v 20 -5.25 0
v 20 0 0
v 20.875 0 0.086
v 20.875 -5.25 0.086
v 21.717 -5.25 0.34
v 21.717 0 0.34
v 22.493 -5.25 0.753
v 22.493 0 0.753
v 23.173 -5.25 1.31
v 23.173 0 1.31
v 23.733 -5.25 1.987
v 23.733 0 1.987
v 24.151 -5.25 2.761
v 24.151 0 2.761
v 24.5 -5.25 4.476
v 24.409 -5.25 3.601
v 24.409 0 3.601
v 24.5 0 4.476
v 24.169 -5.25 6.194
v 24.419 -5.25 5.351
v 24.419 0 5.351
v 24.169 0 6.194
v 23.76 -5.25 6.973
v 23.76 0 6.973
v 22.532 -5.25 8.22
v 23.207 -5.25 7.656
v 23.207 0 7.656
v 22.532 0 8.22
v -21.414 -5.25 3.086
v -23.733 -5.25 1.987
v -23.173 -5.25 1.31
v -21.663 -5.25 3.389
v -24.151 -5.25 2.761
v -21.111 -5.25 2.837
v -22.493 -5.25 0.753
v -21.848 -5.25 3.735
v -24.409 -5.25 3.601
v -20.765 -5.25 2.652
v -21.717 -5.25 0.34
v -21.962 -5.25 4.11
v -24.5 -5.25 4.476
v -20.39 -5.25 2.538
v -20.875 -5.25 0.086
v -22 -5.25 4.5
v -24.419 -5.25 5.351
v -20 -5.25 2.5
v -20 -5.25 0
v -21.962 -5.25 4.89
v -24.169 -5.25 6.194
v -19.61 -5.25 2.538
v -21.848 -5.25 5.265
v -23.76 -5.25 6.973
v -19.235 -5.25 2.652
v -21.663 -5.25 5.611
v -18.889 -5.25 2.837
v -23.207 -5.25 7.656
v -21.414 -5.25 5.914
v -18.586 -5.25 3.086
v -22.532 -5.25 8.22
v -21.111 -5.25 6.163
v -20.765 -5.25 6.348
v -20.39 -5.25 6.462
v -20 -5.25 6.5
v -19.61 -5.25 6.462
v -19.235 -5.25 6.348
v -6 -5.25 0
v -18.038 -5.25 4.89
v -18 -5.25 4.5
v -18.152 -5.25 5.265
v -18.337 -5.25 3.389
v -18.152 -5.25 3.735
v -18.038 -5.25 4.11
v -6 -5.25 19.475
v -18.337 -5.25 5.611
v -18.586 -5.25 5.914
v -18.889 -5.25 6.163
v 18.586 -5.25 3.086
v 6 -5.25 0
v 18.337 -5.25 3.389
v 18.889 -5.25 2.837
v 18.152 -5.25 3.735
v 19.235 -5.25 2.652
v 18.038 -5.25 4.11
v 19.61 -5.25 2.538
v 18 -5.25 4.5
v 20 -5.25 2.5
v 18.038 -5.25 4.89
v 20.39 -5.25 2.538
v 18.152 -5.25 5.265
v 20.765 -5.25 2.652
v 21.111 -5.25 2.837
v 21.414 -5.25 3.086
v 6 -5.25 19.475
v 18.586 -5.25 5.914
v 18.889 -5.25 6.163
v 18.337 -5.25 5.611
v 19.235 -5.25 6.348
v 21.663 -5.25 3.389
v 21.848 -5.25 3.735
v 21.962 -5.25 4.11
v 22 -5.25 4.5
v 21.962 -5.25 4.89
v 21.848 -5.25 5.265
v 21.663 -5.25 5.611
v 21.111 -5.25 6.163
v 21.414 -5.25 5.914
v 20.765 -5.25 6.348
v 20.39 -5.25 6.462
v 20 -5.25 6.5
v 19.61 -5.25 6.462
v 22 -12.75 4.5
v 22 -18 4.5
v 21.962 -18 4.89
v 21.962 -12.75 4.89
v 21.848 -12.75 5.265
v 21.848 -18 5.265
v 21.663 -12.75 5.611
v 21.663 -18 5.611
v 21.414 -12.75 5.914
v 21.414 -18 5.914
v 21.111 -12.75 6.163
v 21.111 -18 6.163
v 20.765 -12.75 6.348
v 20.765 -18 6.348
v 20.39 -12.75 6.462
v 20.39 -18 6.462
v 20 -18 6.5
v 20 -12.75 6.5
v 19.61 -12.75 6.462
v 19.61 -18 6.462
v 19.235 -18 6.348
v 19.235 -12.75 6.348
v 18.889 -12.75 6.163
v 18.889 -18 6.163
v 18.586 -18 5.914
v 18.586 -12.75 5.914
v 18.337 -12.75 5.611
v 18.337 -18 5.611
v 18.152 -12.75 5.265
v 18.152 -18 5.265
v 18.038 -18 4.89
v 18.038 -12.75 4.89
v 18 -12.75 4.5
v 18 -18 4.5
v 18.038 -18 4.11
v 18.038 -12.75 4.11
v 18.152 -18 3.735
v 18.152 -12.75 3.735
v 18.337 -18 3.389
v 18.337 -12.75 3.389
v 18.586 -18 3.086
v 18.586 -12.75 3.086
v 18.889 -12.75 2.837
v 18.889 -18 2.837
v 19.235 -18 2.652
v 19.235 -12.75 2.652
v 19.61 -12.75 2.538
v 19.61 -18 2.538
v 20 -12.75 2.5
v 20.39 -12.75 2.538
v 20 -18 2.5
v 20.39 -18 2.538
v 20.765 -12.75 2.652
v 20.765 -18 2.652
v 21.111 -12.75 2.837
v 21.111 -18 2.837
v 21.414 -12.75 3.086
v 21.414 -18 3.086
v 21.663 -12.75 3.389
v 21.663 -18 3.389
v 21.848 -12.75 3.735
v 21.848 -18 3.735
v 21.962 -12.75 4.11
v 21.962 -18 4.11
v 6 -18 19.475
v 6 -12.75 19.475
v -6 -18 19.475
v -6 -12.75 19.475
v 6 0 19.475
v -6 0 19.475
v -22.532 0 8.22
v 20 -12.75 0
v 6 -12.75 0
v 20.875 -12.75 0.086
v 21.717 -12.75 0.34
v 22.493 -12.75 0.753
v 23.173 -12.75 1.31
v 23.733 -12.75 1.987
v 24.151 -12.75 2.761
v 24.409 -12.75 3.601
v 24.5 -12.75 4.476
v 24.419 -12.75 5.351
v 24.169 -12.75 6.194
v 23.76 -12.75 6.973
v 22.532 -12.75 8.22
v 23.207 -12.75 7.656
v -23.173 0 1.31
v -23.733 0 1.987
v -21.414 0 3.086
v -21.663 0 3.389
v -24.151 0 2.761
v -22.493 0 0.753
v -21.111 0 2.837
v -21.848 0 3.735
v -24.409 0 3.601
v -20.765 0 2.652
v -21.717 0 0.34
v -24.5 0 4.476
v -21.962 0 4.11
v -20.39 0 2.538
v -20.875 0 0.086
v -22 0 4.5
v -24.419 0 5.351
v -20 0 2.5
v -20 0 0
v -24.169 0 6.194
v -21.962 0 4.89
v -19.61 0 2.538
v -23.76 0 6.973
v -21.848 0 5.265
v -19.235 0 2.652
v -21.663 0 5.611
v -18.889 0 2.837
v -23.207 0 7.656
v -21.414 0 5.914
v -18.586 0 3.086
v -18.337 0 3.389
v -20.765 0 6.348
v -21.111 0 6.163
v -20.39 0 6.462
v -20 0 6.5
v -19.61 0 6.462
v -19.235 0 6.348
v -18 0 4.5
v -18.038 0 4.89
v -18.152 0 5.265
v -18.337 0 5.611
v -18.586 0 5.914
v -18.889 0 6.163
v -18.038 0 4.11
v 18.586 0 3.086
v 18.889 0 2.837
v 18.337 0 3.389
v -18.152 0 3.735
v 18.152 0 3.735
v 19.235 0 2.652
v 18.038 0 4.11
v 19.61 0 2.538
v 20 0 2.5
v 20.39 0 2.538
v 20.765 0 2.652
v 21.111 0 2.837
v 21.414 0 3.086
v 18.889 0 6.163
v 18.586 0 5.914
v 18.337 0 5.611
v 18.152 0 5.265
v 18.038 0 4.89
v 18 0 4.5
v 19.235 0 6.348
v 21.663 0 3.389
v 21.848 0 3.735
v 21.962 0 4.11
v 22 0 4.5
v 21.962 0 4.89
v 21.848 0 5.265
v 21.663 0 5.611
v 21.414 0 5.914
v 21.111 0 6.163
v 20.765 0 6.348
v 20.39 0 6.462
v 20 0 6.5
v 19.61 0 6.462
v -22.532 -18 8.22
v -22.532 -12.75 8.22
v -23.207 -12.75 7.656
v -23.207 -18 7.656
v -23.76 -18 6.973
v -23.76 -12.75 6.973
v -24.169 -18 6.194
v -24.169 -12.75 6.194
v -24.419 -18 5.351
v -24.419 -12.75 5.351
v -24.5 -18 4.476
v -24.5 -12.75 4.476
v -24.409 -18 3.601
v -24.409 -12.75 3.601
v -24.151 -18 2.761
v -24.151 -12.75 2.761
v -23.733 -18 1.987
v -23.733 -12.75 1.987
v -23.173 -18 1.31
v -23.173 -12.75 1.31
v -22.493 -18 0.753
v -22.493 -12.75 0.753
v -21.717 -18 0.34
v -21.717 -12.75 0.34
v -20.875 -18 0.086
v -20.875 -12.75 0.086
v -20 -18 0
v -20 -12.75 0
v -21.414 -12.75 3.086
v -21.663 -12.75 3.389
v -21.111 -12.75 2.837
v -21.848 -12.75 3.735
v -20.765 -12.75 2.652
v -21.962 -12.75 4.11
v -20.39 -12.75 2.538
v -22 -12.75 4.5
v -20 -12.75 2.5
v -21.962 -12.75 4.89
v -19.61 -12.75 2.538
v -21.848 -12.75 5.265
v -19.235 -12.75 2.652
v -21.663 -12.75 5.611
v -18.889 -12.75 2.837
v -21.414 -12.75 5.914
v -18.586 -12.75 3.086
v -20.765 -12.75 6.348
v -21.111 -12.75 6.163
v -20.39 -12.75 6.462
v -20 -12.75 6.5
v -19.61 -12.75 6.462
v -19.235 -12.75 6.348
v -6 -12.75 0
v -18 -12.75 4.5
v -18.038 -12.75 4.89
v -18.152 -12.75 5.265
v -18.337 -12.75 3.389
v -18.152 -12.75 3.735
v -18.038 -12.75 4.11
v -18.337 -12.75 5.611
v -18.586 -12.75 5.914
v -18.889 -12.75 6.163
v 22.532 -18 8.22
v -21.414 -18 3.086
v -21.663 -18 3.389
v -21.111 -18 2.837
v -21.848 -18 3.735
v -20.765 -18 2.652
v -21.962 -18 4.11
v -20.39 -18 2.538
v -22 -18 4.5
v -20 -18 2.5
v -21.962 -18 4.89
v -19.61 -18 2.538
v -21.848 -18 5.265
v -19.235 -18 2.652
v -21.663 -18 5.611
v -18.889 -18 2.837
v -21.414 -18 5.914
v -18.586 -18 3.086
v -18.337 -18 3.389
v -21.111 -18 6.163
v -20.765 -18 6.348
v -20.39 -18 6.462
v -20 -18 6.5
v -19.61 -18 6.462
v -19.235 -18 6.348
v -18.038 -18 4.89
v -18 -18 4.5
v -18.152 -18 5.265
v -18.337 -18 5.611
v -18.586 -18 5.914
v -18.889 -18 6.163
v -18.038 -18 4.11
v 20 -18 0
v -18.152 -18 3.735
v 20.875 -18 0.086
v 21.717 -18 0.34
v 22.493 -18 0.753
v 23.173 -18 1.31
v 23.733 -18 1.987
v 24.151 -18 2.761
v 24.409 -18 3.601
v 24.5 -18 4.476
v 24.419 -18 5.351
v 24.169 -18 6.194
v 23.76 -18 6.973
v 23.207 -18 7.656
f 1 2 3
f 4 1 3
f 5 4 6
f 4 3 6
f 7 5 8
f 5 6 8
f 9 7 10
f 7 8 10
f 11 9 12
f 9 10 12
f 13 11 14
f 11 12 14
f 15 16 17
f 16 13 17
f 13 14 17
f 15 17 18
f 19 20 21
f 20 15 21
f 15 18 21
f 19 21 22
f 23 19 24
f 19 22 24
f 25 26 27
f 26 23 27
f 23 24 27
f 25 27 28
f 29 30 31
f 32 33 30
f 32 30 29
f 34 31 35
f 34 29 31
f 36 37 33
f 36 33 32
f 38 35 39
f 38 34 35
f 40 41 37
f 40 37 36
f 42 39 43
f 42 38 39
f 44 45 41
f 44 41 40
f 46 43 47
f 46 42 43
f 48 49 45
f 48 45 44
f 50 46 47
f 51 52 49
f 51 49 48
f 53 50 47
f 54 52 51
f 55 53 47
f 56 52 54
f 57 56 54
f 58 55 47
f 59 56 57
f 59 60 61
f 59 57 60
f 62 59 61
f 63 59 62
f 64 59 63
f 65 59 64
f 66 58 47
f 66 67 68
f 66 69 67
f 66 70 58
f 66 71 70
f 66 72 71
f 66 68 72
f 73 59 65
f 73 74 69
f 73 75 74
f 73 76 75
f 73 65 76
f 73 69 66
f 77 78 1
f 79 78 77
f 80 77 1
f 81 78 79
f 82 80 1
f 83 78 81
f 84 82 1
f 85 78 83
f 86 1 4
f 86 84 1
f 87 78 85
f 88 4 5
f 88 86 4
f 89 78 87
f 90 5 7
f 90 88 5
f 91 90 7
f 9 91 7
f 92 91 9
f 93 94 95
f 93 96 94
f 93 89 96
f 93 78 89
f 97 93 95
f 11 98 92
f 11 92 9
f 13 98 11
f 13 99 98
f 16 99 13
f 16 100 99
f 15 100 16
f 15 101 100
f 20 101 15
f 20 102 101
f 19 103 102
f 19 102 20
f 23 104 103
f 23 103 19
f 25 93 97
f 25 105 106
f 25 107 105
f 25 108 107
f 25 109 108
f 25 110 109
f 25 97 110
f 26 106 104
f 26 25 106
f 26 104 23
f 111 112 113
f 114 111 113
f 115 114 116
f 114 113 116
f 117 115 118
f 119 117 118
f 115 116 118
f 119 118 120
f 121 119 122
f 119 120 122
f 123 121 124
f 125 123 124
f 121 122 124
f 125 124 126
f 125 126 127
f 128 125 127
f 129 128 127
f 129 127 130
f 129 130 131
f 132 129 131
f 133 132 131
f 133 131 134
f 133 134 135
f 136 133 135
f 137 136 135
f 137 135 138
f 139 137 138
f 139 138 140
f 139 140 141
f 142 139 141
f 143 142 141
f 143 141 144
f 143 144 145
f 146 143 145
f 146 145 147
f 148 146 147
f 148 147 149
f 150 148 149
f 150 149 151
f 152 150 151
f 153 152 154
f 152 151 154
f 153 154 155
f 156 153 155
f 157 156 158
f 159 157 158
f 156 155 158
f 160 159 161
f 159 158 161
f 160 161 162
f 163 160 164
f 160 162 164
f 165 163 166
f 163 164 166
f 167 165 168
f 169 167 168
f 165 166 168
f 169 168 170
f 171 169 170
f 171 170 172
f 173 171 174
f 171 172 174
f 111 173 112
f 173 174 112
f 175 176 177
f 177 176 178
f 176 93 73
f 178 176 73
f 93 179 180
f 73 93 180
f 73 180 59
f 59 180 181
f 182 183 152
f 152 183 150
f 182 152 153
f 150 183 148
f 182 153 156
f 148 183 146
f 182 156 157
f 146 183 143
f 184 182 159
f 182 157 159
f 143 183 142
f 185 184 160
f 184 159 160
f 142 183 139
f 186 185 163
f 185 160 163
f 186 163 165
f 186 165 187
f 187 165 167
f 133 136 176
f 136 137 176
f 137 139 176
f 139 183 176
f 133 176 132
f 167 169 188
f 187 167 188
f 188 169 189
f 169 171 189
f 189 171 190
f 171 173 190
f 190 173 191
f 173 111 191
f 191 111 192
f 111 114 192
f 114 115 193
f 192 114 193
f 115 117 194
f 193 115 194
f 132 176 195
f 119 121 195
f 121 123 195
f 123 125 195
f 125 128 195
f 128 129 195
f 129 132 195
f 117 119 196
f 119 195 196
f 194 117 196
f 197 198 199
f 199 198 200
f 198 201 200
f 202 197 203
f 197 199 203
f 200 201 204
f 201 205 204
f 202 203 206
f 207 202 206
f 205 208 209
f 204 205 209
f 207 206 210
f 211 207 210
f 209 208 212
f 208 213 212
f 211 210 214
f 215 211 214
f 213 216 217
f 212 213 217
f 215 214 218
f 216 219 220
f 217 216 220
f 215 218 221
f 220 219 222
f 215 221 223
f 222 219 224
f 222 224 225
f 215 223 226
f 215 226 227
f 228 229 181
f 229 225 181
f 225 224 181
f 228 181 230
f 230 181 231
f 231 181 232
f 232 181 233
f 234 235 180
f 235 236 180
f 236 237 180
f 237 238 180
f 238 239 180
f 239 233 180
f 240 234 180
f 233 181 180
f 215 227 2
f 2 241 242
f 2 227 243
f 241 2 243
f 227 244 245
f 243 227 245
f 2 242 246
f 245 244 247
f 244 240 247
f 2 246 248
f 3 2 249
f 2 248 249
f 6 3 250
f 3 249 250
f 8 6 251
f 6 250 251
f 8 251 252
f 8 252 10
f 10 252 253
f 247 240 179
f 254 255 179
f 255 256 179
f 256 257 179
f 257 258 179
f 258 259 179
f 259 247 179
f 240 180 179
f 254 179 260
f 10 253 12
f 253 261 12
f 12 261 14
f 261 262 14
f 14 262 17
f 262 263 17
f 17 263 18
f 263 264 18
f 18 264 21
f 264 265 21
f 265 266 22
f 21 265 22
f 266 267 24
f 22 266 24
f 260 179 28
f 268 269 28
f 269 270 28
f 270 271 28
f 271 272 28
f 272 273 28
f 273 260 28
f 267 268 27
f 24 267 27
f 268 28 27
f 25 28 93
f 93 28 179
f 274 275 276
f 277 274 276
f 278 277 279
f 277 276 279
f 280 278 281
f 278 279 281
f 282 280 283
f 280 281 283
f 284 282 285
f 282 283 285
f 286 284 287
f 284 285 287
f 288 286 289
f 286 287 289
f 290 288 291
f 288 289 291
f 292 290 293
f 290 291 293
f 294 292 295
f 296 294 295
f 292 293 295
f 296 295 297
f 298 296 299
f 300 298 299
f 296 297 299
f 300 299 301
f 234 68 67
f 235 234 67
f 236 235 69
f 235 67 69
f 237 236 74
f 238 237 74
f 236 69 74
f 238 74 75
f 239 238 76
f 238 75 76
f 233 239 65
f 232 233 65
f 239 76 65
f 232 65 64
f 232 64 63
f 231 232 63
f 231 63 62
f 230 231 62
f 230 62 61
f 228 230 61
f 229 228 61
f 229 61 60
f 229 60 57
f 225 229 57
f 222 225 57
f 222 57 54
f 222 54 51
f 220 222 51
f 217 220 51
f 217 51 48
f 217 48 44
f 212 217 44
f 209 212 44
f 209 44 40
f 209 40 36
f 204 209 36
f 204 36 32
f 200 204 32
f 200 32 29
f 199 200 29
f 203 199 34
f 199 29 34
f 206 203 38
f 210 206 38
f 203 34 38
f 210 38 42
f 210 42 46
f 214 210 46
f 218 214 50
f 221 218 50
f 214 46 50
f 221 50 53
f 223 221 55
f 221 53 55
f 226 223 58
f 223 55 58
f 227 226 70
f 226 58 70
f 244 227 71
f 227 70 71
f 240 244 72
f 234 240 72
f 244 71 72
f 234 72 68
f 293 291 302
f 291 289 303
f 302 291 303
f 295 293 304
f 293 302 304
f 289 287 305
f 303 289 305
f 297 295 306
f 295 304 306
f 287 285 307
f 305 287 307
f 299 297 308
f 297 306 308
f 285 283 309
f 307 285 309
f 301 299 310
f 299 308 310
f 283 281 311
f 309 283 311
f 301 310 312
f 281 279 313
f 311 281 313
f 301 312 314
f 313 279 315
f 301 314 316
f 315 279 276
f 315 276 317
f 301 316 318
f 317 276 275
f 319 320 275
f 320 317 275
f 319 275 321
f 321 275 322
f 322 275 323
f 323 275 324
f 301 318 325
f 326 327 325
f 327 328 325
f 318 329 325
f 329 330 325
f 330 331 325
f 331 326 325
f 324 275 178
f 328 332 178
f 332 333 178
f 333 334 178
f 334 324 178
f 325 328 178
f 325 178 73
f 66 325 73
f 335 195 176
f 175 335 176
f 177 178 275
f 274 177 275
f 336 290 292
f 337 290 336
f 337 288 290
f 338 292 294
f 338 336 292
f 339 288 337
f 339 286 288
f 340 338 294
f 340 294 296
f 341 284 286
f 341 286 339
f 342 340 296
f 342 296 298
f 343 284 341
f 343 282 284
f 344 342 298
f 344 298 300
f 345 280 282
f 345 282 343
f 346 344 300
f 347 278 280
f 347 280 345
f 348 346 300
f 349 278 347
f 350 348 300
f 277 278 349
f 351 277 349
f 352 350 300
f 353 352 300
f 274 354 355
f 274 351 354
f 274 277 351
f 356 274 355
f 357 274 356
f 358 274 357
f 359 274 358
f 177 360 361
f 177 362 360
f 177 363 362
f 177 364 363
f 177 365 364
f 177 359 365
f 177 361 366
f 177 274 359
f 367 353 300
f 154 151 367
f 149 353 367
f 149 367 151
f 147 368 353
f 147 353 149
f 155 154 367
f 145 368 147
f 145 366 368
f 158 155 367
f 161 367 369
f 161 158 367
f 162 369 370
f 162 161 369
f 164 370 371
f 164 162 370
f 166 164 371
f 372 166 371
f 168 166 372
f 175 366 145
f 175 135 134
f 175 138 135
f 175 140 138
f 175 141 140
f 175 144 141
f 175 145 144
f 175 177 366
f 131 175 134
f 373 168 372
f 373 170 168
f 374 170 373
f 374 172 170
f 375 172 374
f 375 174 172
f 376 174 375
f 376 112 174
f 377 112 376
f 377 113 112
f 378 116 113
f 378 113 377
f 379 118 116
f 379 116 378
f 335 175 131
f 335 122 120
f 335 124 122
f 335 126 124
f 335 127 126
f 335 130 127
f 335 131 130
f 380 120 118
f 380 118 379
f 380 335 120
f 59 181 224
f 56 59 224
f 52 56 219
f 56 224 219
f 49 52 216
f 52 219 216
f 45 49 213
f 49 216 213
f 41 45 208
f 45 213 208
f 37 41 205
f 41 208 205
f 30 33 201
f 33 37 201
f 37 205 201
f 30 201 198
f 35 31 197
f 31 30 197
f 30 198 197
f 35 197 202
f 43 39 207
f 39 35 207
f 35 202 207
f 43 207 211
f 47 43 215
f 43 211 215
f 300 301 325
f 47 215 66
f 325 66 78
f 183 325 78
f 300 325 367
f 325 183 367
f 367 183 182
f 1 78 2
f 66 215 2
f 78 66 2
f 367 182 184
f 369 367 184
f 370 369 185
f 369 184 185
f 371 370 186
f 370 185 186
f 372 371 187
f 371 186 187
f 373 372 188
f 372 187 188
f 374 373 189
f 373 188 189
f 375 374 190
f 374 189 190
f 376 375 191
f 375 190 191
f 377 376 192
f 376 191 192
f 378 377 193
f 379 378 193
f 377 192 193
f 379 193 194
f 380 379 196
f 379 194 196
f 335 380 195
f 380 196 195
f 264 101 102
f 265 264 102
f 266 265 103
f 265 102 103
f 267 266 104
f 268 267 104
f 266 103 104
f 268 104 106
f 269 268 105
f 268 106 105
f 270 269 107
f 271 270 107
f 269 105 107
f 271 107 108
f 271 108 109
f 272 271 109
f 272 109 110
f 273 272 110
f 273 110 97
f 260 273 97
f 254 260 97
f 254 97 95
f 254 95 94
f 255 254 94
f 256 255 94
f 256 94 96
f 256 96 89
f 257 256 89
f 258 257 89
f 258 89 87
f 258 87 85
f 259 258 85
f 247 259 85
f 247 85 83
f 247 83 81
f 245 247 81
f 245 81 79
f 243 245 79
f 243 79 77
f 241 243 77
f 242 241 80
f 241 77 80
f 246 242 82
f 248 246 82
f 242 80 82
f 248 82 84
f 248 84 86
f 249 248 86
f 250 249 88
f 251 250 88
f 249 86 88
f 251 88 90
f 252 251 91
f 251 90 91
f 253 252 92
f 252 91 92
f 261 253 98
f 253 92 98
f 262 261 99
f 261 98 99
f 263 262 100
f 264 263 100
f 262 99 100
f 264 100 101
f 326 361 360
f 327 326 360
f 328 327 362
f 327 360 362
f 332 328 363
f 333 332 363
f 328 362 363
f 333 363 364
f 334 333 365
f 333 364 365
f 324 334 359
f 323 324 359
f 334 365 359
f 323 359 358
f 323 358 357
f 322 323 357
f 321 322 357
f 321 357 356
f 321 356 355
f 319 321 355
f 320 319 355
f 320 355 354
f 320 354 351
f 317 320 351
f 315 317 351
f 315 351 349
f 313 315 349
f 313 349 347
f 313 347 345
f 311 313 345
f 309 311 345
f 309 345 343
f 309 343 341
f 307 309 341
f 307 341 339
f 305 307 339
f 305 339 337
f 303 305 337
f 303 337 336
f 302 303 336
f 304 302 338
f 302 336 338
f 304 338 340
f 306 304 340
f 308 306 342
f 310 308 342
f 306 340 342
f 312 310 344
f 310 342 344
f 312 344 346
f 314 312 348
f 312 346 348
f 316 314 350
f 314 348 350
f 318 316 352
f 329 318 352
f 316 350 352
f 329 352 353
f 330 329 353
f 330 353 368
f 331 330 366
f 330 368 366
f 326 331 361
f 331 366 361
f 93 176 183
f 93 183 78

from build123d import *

# Parameters (mm, degrees)
F1_DEPTH = 18
F2_W     = 25.921413
F2_H     = 7.5
F3_DEPTH = 25
F4_R     = 2
F5_DEPTH = 25


with BuildPart() as f1:
    # F0 (on Front) → F1 (new body)
    with BuildSketch(Plane.XZ):
        with BuildLine():
            Line((-20, 0), (0, 0))
            Line((0, 0), (20, 0))
            ThreePointArc((20, 0), (24.300527, 3.175061), (22.532417, 8.219794))
            Line((22.532417, 8.219794), (6, 19.474979))
            Line((6, 19.474979), (-6, 19.474979))
            Line((-6, 19.474979), (-22.532417, 8.219794))
            ThreePointArc((-22.532417, 8.219794), (-24.300527, 3.175061), (-20, 0))
        make_face()
    extrude(amount=F1_DEPTH)

    # F2 (on face) → F3 (cut)
    with BuildSketch(Plane.XY.offset(19.474979)):
        with Locations((-18.960707, -9)):
            Rectangle(F2_W, F2_H)
        with Locations((18.960707, -9)):
            Rectangle(F2_W, F2_H)
    extrude(amount=-F3_DEPTH, mode=Mode.SUBTRACT)

    # F4 (on face) → F5 (cut)
    with BuildSketch(Plane.XZ.offset(18)):
        with Locations((-20, 4.5)):
            Circle(F4_R)
        with Locations((20, 4.5)):
            Circle(F4_R)
    extrude(amount=-F5_DEPTH, mode=Mode.SUBTRACT)


solid = f1.part
